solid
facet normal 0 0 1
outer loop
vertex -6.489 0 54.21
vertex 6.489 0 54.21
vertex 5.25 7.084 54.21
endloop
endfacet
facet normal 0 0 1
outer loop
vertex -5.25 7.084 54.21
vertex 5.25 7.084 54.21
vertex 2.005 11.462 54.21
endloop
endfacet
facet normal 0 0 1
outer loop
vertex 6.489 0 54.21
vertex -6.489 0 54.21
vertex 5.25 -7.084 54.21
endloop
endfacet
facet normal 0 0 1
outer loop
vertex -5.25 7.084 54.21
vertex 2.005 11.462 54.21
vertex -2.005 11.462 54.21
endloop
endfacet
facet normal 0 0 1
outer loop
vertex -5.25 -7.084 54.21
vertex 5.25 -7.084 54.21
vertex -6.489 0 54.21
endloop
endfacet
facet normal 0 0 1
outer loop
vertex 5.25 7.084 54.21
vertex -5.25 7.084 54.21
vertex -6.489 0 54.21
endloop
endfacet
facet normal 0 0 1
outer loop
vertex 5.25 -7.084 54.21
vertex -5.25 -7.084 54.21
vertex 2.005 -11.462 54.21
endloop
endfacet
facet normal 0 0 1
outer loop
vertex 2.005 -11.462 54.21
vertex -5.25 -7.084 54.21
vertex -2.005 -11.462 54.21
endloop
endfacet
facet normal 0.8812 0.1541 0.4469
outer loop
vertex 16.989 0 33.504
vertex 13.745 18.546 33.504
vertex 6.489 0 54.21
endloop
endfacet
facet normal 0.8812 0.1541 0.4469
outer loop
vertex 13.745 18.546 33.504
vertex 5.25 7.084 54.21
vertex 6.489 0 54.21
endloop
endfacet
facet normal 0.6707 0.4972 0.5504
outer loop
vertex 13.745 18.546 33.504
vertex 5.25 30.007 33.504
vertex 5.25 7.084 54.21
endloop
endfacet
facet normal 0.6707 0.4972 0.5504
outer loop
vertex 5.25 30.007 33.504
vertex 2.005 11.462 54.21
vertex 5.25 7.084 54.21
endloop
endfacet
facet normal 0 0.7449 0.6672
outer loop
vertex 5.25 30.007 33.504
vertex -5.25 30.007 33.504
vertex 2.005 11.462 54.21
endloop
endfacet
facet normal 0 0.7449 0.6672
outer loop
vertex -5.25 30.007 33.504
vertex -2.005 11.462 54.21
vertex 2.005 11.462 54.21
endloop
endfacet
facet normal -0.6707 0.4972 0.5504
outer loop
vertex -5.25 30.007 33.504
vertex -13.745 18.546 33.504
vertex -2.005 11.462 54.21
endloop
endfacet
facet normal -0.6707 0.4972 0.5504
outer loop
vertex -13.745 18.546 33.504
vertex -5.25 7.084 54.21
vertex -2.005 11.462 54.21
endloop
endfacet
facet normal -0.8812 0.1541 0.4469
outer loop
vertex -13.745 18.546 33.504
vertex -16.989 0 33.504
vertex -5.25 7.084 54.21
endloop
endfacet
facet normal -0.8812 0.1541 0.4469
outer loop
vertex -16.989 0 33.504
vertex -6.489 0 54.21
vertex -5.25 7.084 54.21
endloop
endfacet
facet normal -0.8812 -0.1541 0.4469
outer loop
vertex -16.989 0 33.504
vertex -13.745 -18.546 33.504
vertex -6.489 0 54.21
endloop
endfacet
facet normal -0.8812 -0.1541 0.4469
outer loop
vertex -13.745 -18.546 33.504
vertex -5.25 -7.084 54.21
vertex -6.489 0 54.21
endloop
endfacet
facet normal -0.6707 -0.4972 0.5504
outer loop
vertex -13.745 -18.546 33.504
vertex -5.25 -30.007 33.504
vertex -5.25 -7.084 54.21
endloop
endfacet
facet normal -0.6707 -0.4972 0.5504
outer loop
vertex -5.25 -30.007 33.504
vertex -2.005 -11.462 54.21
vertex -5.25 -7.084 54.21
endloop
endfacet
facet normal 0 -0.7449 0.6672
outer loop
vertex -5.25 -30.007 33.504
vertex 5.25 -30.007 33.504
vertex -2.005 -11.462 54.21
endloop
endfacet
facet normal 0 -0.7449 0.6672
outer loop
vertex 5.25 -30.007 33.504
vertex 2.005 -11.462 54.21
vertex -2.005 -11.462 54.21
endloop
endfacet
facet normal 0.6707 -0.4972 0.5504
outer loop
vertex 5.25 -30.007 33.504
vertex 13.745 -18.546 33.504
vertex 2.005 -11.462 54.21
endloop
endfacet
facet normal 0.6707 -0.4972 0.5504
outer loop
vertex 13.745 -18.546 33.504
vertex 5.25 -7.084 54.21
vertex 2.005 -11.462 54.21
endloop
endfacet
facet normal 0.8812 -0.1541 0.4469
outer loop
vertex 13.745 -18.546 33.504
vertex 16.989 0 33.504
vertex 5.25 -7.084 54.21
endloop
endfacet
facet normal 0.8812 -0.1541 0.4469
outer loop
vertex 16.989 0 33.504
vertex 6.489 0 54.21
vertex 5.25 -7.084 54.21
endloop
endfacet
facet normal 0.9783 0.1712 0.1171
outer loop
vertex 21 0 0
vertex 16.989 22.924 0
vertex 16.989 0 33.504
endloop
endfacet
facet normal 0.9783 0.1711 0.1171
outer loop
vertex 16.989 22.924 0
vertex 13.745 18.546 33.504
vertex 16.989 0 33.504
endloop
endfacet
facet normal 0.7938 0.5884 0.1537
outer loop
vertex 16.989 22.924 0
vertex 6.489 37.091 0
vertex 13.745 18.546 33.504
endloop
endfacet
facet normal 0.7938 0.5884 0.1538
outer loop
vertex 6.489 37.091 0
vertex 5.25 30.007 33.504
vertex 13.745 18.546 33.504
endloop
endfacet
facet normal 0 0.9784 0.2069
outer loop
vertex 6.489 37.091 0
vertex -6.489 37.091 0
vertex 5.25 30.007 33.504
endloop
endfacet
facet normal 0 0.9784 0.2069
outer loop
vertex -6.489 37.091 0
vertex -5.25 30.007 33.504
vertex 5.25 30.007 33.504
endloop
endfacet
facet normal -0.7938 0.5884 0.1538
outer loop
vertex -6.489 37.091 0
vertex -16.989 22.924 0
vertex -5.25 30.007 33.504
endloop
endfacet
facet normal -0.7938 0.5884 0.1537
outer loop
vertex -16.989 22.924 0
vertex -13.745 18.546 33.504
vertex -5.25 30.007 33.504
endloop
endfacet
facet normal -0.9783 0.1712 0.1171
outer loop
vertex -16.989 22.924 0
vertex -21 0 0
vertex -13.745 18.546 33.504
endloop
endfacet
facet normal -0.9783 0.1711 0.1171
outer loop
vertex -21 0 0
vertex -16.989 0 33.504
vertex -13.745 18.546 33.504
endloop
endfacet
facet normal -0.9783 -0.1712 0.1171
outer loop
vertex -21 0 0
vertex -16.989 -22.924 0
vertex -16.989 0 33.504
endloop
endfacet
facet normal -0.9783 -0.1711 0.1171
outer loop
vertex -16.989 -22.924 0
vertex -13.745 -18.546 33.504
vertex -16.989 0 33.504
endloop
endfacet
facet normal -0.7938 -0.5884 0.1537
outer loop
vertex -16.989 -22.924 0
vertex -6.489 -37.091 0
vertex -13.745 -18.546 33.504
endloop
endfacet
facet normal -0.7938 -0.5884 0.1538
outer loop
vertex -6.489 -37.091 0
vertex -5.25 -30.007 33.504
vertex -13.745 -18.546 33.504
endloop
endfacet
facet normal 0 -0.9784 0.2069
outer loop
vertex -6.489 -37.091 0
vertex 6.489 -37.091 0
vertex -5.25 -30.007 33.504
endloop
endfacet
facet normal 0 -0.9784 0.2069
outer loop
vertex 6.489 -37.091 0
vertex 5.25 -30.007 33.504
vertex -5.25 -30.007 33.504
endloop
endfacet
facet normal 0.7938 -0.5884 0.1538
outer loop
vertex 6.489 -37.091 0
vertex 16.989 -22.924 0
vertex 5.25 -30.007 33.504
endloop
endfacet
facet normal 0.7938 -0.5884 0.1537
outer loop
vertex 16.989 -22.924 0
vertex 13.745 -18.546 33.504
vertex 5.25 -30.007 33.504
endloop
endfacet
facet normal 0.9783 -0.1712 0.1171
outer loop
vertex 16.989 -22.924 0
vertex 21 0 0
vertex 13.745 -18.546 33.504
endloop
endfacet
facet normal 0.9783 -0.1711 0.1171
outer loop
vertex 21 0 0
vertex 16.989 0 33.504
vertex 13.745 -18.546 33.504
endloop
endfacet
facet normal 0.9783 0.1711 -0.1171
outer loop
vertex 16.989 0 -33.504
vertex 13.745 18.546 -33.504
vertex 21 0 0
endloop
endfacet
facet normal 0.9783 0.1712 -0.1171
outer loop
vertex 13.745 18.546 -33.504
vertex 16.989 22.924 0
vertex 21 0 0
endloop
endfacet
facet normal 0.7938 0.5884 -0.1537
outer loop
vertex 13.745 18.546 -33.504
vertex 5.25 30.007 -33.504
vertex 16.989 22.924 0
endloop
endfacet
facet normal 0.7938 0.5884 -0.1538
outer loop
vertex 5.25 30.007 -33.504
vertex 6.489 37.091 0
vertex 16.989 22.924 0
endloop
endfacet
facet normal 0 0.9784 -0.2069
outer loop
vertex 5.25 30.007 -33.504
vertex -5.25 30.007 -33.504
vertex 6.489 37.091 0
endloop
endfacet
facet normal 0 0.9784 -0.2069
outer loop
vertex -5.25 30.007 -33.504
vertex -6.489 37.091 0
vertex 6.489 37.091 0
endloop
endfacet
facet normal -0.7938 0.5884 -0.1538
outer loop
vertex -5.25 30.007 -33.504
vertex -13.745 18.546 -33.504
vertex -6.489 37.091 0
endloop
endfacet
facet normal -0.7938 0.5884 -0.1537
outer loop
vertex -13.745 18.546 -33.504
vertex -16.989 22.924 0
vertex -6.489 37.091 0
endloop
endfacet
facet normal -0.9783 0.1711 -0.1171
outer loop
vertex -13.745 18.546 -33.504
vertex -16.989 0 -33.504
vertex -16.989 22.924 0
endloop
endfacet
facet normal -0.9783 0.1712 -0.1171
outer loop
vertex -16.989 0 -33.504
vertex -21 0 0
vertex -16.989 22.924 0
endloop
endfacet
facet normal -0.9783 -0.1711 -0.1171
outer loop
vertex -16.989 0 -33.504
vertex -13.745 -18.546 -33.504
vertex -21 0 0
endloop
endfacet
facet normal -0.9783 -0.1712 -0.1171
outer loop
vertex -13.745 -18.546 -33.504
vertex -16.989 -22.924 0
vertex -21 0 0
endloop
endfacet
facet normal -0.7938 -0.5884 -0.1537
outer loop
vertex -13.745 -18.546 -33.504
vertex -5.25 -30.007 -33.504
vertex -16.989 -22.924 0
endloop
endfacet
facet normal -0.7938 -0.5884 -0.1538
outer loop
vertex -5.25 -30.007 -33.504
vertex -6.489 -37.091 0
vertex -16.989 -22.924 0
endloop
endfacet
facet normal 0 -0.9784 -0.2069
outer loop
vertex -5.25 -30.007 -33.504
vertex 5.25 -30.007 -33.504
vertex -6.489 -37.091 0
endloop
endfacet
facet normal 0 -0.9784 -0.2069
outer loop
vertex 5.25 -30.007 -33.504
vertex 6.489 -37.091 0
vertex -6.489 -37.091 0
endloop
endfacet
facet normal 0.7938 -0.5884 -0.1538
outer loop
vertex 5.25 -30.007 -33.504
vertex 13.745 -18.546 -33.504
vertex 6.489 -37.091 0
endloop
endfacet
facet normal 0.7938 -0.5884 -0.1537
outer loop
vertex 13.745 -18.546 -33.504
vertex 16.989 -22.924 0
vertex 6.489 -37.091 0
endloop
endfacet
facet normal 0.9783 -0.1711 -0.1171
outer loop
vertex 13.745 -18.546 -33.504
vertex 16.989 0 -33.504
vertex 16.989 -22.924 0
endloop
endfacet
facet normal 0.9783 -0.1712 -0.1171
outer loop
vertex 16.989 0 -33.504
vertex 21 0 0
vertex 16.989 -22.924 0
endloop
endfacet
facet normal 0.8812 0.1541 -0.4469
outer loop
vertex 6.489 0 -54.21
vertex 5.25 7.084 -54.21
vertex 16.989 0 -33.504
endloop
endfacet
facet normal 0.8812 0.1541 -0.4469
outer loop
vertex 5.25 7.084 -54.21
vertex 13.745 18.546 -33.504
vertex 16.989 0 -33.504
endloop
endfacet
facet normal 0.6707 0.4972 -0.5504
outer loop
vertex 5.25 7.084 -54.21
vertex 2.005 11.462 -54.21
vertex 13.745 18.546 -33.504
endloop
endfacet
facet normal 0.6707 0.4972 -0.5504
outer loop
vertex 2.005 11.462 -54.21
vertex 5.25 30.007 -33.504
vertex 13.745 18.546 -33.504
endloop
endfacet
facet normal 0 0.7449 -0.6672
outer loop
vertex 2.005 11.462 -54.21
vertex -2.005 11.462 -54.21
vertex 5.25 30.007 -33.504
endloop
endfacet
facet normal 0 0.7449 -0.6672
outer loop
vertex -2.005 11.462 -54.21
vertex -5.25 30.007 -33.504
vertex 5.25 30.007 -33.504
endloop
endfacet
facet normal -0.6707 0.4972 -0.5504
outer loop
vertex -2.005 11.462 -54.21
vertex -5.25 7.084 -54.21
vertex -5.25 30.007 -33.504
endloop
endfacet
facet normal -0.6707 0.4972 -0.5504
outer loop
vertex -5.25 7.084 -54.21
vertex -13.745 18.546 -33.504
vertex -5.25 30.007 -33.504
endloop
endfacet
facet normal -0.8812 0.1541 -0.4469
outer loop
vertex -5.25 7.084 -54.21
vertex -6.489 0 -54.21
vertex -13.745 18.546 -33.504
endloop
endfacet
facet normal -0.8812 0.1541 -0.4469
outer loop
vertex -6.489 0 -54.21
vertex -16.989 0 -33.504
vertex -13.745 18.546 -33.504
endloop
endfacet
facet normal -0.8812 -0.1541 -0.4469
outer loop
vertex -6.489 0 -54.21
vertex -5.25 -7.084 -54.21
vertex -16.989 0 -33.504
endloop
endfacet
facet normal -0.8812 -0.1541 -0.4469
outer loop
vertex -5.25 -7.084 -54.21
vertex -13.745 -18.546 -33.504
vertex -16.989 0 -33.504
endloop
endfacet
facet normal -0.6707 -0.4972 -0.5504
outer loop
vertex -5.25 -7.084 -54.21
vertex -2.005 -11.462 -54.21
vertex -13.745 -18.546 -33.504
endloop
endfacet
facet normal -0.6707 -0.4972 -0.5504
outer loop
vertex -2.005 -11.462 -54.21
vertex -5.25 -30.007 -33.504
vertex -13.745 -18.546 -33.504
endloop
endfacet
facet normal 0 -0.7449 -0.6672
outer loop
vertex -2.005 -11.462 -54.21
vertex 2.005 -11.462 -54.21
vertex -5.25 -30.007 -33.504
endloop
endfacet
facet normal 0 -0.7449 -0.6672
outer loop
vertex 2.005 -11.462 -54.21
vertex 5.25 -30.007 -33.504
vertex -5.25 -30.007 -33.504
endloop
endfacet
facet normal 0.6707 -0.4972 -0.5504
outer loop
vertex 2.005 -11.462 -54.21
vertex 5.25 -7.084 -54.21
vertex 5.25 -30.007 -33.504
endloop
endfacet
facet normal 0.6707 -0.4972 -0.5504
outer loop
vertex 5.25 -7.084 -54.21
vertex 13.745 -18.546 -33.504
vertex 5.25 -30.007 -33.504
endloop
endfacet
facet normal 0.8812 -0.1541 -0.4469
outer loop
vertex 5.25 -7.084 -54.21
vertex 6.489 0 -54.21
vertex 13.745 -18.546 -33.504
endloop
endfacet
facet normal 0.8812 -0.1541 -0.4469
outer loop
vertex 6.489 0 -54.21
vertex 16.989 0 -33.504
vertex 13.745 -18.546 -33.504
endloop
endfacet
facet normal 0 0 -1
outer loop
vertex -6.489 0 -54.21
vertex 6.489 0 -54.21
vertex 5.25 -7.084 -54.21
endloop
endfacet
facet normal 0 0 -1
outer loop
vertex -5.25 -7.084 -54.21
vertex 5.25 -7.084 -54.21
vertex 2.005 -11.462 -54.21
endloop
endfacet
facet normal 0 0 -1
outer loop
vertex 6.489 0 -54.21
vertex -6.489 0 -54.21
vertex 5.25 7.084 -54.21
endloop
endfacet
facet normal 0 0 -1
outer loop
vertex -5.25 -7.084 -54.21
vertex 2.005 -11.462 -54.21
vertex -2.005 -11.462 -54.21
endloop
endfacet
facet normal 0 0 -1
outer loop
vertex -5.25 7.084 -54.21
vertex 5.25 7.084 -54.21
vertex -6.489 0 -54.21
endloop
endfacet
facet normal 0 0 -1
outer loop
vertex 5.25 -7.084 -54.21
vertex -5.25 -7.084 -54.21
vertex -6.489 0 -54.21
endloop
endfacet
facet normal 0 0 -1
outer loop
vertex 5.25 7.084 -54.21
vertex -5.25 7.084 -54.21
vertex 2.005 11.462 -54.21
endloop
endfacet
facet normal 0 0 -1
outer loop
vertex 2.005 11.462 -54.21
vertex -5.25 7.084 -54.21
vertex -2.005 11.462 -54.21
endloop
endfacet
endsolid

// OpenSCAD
// Generated by SolidPython 1.0.1 on 2020-07-29 00:46:47


scale(v = [7, 13, 19]) {
	sphere(r = 3);
}
/***********************************************
*********      SolidPython code:      **********
************************************************
 
# import packages: SolidPython
from solid import *
from solid.utils import *
from itertools import chain, combinations, permutations


class Resize:

    def __init__(self, scad_file):
        self.scad_file = scad_file
        #self.scad_file = import_scad(scad_file)
        # cone/cylinder param:
        self.r1 = 0
        self.r2 = 0
        self.h = 0
        # rectangular prism param:
        self.w = 0
        self.l = 0
        # ellipse param:
        self.r = 0

    # import OpenScad code (file name corresponds to shape)


    # classify shape + parameters
    def assign(self, param1, param2, param3):
        if self.scad_file == 'cone.scad':
            self.r1 = param1
            self.r2 = param2
            self.h = param3
        elif self.scad_file == 'cylinder.scad':
            self.r1 = param1
            self.r2 = param2
            self.h = param3
        elif self.scad_file == 'rectangularPrism.scad':
            self.h = param1
            self.l = param2
            self.w = param3
        else:
            self.r = param1
            self.h = param2

    # resize parameters
    def iterate(self):
        x = range(3, 20, 2)
        i = 1
        if self.scad_file == 'cone.scad':
            tempList = list(permutations(x, 2))
            for temp in tempList:
                param1 = temp[0]
                param2 = temp[1]
                filepath = 'produced_scad_files/' + 'cone' + str(param1) + '_' + str(param2) + '_' + '.scad'
                scad_render_to_file(cylinder(h=param1, r1=param2, r2=0), filepath)

        elif self.scad_file == 'cylinder.scad':
            tempList = list(permutations(x, 3))
            for temp in tempList:
                param1 = temp[0]
                param2 = temp[1]
                filepath = 'produced_scad_files/' + 'cylinder' + str(param1) + '_' + str(param2) + '_' + '.scad'
                scad_render_to_file(cylinder(h=param1, r1=param2, r2=param2), filepath)

        elif self.scad_file == 'rectangularPrism.scad':
            tempList = list(permutations(x, 3))
            for temp in tempList:
                param1 = temp[0]
                param2 = temp[1]
                param3 = temp[2]
                filepath = 'produced_scad_files/' + 'rectangularPrism' + str(param1) + '_' + str(param2) + '_' + str(
                    param3) + '.scad'
                scad_render_to_file(cube(size=(param1, param2, param3)), filepath)

        elif self.scad_file == 'ellipse.scad':
            tempList = list(permutations(x, 4))
            for temp in tempList:
                param1 = temp[0]
                param2 = temp[1]
                param3 = temp[2]
                param4 = temp[3]
                filepath = 'produced_scad_files/' + 'ellipse' + str(param1) + '_' + str(param2) + '_' + str(param3) + '_' + str(param4) + '.scad'
                scad_render_to_file(scale([param1, param2, param3])(sphere(r=param4)), filepath)

    def render_to_scadfile(self):
        scad_render_to_file(scad, 'example.scad') 
 
************************************************/
